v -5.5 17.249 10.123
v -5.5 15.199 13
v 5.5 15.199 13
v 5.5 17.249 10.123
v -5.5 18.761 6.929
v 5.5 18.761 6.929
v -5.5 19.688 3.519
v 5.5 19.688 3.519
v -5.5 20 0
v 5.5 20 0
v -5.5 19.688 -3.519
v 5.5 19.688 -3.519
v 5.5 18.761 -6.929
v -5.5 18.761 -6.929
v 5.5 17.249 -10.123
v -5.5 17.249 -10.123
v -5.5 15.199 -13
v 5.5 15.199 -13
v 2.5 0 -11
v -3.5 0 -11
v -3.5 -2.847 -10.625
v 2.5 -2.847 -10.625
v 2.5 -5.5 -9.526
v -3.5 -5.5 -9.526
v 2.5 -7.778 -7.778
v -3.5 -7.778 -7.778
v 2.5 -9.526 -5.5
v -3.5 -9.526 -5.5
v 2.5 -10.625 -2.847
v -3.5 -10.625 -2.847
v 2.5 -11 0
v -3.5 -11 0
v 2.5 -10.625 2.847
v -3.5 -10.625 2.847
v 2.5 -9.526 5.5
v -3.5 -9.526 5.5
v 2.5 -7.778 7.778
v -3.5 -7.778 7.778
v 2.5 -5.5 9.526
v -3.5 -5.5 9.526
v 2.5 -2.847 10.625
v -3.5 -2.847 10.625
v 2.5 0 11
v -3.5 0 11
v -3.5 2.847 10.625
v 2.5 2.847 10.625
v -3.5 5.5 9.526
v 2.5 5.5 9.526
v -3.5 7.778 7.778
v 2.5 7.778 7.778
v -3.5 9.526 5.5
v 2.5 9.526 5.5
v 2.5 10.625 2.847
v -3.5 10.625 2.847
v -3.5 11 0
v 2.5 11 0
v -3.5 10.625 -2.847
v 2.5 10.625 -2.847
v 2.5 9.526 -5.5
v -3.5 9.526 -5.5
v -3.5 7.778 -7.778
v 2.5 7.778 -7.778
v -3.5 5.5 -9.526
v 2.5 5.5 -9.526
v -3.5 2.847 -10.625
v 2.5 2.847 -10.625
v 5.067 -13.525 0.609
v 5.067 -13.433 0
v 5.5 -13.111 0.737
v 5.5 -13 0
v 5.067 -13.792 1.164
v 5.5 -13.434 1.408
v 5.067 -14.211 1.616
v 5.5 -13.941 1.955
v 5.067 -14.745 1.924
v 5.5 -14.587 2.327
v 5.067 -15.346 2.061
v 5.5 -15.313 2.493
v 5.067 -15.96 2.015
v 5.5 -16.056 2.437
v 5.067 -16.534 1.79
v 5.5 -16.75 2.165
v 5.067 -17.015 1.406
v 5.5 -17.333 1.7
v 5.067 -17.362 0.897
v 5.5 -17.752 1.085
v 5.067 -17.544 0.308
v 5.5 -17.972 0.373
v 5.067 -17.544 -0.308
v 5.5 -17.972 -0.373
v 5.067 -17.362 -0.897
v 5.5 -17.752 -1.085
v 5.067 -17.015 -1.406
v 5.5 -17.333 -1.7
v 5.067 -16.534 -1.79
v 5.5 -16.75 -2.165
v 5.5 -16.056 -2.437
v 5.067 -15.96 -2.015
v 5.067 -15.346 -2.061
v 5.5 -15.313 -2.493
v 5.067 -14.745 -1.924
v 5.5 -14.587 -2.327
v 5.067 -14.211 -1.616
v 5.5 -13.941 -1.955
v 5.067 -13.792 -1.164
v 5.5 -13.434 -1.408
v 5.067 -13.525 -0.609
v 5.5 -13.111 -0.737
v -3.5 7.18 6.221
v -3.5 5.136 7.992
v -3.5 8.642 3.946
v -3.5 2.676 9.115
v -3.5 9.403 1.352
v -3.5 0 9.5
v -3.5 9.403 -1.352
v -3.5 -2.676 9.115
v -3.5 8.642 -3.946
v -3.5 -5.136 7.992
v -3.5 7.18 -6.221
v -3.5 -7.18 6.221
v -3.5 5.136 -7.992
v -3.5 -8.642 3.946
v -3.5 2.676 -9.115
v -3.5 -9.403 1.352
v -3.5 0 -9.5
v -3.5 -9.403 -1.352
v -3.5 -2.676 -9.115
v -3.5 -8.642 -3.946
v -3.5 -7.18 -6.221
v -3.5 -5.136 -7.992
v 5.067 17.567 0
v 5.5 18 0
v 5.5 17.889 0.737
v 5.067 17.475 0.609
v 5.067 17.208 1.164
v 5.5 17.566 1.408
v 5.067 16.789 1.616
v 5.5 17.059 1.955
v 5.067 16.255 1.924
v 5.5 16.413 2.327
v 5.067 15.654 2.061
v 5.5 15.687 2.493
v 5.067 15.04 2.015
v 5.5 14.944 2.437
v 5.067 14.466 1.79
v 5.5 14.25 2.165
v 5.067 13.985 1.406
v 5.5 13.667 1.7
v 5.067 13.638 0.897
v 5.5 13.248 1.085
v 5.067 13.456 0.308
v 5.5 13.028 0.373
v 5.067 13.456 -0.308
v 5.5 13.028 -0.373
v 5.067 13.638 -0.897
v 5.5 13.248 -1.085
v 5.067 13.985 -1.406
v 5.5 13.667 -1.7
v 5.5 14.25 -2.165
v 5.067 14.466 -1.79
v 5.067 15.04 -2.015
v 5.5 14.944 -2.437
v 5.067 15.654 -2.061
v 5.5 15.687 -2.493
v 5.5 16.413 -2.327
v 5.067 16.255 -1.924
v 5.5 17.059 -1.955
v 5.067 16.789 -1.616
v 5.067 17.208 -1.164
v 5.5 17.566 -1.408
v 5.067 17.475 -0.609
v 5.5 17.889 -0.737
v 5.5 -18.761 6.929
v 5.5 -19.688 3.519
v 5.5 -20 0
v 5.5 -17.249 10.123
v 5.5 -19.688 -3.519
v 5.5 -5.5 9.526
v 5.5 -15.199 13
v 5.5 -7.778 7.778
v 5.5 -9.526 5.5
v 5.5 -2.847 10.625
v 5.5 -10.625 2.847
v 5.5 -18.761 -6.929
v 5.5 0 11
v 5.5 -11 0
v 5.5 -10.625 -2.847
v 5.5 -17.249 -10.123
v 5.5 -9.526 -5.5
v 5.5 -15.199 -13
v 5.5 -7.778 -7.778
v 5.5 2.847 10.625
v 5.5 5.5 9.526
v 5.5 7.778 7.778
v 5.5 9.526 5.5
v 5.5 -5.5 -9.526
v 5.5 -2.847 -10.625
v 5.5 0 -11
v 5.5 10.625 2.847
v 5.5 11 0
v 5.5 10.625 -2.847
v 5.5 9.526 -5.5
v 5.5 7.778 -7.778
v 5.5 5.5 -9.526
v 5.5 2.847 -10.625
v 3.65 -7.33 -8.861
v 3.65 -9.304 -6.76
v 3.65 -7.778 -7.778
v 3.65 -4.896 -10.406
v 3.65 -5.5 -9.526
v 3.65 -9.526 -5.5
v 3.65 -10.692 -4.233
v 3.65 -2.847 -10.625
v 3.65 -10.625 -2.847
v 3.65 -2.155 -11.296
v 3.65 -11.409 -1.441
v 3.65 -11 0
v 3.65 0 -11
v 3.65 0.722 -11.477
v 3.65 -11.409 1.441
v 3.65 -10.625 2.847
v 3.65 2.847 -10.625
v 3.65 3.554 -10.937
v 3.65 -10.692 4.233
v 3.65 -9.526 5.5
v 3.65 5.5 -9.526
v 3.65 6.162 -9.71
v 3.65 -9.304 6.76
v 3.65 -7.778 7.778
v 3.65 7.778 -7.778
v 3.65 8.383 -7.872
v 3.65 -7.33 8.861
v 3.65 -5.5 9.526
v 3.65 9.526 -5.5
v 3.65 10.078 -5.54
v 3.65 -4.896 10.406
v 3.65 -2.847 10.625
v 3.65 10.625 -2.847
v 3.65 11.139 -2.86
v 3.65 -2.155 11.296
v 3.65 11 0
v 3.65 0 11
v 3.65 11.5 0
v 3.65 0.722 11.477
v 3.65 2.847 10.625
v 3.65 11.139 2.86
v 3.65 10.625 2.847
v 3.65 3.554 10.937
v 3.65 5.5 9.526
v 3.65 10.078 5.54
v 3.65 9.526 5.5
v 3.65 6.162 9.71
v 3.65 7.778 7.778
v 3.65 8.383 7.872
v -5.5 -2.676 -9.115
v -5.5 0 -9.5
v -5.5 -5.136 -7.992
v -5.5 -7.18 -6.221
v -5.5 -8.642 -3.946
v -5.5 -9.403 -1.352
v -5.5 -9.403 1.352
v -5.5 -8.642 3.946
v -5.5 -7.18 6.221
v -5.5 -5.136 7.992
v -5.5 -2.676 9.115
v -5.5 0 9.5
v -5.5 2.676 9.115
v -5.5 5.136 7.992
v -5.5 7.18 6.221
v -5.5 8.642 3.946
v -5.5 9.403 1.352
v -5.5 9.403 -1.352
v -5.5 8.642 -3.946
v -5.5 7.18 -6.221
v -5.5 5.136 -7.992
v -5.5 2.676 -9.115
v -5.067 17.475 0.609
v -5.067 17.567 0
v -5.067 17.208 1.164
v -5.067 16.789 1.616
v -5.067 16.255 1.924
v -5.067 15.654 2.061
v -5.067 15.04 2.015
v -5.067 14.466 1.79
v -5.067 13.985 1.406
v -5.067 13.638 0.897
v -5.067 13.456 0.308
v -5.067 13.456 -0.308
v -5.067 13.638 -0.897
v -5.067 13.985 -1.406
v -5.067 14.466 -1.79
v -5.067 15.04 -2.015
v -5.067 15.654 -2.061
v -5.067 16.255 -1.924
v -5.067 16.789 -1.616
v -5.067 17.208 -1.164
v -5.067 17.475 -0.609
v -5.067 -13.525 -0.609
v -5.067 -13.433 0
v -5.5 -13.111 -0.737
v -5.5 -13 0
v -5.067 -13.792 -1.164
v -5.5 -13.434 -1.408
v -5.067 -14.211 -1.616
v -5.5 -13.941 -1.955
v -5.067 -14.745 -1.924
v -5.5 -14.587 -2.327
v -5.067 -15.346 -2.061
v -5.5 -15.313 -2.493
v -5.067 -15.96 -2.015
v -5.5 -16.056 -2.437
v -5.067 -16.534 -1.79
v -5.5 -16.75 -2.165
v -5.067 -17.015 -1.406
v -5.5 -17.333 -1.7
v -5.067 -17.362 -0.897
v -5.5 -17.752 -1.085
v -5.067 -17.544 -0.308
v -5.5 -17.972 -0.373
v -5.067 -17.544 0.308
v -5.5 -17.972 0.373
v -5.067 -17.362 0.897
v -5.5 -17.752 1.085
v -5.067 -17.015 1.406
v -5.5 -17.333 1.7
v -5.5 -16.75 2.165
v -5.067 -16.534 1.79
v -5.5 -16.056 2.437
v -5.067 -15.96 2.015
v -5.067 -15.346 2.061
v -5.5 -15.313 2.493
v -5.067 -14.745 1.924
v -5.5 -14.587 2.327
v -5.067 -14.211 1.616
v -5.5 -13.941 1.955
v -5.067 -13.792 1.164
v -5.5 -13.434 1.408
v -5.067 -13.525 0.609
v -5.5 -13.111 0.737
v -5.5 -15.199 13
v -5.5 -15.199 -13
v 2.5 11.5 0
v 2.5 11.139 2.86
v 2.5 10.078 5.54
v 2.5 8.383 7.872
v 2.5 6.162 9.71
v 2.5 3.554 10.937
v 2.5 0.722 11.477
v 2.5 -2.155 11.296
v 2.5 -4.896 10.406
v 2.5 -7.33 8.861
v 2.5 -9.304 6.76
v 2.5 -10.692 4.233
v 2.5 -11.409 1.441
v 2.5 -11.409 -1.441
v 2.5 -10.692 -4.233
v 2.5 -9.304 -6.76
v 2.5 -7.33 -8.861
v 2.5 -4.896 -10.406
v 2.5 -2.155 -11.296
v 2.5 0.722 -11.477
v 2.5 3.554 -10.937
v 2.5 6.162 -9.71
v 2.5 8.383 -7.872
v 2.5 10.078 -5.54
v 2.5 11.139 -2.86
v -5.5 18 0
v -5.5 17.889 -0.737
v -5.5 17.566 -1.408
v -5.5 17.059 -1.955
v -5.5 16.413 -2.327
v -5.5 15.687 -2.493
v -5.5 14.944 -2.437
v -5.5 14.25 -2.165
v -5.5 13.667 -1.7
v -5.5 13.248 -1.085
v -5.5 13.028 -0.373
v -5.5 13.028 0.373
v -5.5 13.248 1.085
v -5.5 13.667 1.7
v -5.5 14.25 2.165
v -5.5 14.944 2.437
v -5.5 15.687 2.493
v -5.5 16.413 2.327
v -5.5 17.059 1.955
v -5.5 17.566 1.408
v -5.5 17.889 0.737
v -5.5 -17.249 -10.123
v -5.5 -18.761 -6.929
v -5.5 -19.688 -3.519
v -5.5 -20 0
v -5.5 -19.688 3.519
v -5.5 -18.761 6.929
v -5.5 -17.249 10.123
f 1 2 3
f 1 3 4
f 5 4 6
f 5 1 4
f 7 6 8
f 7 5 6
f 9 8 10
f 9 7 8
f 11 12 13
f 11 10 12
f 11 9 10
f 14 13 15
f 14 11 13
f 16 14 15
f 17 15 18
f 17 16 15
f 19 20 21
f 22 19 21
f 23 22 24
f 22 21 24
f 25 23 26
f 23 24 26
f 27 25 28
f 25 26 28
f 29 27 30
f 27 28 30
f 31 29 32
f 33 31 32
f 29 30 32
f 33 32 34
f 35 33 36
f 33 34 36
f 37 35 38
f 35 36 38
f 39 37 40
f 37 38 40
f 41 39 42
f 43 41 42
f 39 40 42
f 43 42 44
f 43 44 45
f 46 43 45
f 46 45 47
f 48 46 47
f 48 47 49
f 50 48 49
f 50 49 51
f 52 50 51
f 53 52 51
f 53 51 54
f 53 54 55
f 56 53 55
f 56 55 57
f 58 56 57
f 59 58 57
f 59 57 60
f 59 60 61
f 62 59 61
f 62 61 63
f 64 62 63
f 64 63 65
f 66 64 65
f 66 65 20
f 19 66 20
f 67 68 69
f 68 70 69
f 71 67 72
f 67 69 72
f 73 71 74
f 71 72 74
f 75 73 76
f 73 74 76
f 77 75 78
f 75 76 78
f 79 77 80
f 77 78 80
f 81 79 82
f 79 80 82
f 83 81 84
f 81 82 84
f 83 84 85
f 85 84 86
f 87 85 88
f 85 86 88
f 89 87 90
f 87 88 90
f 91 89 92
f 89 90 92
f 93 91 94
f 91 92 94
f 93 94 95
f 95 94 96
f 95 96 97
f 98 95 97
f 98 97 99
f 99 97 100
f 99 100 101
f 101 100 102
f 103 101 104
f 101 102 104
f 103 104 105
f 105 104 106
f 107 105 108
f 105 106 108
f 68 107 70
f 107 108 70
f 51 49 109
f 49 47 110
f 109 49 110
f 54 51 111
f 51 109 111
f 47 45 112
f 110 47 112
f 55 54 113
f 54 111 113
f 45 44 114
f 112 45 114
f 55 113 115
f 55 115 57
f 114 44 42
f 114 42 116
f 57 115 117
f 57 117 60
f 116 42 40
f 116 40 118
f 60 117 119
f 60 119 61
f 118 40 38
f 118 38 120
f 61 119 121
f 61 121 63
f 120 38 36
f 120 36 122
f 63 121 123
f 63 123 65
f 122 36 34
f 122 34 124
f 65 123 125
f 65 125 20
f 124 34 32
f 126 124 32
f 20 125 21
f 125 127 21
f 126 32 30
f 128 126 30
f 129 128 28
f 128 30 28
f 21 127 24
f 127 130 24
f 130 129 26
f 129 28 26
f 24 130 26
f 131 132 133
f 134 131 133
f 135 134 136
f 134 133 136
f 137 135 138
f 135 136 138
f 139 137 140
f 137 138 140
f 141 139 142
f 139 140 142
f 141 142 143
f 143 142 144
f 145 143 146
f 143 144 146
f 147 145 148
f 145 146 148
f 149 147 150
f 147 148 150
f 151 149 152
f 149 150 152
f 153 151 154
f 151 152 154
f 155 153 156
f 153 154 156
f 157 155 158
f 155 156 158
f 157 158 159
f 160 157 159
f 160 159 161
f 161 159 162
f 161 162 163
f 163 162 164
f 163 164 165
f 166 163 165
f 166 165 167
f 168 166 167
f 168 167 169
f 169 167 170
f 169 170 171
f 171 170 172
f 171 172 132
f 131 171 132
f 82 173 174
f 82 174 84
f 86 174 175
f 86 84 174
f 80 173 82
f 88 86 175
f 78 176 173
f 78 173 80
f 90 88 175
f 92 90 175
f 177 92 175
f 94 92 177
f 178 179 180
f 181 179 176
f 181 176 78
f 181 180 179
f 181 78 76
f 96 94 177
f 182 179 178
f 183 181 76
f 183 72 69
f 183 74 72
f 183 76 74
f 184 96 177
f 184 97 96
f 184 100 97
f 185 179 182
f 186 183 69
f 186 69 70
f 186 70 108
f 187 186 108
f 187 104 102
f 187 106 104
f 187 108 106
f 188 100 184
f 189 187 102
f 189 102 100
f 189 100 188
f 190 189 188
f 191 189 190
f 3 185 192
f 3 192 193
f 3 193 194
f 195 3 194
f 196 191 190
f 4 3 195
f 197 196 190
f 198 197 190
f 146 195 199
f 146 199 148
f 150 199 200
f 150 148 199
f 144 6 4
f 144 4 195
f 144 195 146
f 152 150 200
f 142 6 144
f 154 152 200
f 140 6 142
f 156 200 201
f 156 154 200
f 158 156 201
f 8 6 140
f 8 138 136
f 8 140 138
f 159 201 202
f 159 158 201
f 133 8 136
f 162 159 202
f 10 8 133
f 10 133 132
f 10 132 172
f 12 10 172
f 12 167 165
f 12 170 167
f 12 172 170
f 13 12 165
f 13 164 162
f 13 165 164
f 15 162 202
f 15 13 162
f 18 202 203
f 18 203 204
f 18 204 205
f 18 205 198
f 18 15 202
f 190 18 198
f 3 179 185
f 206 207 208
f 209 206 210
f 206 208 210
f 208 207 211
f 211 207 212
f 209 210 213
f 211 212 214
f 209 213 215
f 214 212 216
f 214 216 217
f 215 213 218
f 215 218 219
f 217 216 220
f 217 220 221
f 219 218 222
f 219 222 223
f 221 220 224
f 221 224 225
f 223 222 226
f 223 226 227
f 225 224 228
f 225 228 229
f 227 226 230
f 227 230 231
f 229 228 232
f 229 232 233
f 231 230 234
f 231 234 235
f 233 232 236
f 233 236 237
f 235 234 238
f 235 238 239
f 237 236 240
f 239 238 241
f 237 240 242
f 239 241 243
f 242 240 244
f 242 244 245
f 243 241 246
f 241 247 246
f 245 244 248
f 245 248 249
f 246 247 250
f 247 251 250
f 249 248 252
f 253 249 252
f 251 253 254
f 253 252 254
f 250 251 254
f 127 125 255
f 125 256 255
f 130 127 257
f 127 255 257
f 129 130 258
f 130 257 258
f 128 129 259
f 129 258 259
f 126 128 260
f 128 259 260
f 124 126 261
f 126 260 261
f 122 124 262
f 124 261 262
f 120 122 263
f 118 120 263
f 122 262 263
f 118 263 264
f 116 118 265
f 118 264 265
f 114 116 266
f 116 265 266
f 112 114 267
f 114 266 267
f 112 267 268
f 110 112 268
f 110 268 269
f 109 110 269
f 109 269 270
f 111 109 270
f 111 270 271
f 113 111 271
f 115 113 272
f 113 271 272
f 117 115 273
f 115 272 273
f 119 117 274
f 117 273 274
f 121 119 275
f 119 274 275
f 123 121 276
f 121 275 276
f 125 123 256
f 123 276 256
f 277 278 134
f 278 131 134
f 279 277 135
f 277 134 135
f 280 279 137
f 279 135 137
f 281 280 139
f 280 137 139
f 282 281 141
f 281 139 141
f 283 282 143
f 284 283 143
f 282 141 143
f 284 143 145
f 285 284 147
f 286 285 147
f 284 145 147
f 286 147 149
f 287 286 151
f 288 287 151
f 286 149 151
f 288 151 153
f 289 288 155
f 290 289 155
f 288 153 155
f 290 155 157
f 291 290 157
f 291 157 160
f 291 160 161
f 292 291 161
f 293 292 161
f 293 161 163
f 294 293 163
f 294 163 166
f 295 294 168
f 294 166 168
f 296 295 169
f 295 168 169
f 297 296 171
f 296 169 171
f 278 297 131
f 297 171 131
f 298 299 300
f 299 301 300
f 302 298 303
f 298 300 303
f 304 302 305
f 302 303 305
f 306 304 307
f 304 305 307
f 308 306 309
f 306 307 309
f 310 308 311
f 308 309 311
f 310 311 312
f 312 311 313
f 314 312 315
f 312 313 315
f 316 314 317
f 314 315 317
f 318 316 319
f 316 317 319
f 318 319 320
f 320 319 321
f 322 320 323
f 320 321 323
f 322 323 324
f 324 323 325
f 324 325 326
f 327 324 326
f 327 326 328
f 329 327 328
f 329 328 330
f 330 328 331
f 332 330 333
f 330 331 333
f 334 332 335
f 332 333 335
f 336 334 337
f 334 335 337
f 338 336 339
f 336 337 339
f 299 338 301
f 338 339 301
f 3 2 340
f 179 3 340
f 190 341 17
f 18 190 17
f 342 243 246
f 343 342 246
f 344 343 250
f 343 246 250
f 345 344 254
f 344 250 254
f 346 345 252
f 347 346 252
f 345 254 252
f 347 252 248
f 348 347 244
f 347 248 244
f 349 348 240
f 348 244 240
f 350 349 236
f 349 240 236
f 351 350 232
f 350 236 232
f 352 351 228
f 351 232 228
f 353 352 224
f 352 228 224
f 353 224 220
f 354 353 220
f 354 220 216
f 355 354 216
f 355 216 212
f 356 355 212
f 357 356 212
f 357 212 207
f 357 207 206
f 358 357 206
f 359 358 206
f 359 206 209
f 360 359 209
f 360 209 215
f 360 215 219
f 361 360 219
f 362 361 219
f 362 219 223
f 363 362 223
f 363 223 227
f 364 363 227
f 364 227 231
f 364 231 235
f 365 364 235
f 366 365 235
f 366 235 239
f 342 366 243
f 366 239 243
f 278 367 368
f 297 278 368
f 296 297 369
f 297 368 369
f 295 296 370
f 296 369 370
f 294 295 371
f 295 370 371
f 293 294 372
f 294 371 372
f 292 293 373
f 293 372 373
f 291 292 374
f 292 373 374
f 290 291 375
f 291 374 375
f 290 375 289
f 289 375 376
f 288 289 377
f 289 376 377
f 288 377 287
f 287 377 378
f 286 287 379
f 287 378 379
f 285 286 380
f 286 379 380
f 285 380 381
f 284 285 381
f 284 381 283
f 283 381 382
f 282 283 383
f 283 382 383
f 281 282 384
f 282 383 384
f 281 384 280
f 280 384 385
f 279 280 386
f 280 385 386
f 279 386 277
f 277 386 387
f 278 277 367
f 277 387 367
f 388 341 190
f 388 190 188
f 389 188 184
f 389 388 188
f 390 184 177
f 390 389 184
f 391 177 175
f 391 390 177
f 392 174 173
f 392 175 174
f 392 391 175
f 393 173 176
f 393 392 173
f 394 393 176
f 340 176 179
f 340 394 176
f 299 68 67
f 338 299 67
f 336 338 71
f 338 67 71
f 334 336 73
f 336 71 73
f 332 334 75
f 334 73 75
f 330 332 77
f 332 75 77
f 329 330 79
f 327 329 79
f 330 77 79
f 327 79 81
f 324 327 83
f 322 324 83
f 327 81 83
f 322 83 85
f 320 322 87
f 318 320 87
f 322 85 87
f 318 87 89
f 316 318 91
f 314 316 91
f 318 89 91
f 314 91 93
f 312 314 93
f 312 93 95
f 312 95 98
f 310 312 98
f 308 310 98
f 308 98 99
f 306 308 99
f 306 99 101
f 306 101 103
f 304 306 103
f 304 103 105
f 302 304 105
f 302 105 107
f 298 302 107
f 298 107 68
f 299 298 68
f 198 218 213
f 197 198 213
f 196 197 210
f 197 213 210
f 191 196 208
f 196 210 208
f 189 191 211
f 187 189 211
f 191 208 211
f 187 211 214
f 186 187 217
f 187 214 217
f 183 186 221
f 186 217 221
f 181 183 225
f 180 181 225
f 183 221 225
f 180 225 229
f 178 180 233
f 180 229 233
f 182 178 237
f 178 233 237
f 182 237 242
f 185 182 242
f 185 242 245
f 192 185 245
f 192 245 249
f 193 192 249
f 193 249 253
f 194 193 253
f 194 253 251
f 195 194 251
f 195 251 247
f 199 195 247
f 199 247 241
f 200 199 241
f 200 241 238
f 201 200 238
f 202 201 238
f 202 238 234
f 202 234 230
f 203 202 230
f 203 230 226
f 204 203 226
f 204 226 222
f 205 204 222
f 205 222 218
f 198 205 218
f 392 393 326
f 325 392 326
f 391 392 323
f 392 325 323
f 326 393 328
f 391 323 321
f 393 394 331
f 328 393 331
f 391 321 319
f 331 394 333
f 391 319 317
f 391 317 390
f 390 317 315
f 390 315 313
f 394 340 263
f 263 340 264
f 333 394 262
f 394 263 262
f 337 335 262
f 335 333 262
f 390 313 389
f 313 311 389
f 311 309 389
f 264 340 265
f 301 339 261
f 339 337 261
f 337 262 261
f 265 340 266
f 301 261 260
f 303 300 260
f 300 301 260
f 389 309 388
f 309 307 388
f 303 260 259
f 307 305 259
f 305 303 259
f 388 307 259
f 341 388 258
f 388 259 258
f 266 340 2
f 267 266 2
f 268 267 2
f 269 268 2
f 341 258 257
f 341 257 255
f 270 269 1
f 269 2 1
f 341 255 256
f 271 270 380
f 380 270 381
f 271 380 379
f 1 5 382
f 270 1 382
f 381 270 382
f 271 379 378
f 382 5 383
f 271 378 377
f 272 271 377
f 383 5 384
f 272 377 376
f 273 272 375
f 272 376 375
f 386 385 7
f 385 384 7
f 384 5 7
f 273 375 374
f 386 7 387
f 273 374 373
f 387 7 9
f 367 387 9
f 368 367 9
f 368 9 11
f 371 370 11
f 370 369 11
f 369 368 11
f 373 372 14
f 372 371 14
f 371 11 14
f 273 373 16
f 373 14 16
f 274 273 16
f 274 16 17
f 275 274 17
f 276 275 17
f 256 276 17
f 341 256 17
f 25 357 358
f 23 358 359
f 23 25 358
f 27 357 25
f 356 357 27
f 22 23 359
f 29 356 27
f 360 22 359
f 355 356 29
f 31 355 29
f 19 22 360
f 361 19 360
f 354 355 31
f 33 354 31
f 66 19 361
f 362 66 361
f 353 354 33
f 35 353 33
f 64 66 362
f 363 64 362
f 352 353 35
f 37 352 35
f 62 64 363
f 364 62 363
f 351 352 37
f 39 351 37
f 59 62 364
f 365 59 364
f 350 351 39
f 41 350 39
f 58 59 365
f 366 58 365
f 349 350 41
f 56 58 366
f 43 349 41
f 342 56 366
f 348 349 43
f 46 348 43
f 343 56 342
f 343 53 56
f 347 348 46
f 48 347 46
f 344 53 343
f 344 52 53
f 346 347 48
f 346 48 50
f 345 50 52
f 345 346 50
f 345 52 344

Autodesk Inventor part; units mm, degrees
sketch "Sketch_1" plane through (0, 0, 0) normal (1, 0, 0) x (0, 0, -1)
  line L0 (-13, 15.1987) -> (-13, -15.1987)
  arc A0 (-13, -15.1987) -> (13, -15.1987) centre (0, 0) ccw
  line L1 (13, -15.1987) -> (13, 15.1987)
  arc A1 (13, 15.1987) -> (-13, 15.1987) centre (0, 0) ccw
extrude "Extrusion1" add sketch "Sketch_1" along normal mid plane 11
sketch "Sketch2" plane through (5.5, 0, 0) normal (1, 0, 0) x (0, 0, -1)
  point P0 (0, 0)
hole "Hole1" at (5.5, 0, 0) direction (-1, 0, 0) diameter 19 depth 11 counterbore diameter 22 counterbore depth 9
sketch "Sketch_9" plane through (0, 0, 0) normal (0, 0, 1) x (1, 0, 0)
  line L0 (3.65, 0) -> (2.5, 0)
  line L1 (2.5, 0) -> (2.5, 11.5)
  line L2 (2.5, 11.5) -> (3.65, 11.5)
  line L3 (3.65, 11.5) -> (3.65, 0)
  line L4 (3.65, 0) -> (2.5, 0)
revolve "Revolution1" cut sketch "Sketch_9" angle 360 about axis through (3.65, 0, 0) along (1, 0, 0)
sketch "Sketch_8" plane through (0, 0, 0) normal (0, 0, 1) x (1, 0, 0)
  line L0 (5.5, -15.5) -> (-5.5, -15.5)
  line L1 (-5.5, -15.5) -> (-5.5, -13)
  line L2 (-5.5, -13) -> (-5.067, -13.433)
  line L3 (-5.067, -13.433) -> (5.067, -13.433)
  line L4 (5.067, -13.433) -> (5.5, -13)
  line L5 (5.5, -13) -> (5.5, -15.5)
  line L6 (5.5, -15.5) -> (-5.5, -15.5)
revolve "Revolution2" cut sketch "Sketch_8" angle 360 about axis through (5.5, -15.5, 0) along (1, 0, 0)
thread "Thread1" size "M5x0.8" class "6H" standard "ISO Metric profile" full length
sketch "Sketch_2" plane through (0, 0, 0) normal (0, 0, 1) x (1, 0, 0)
  line L0 (5.5, 15.5) -> (-5.5, 15.5)
  line L1 (-5.5, 15.5) -> (-5.5, 18)
  line L2 (-5.5, 18) -> (-5.067, 17.567)
  line L3 (-5.067, 17.567) -> (5.067, 17.567)
  line L4 (5.067, 17.567) -> (5.5, 18)
  line L5 (5.5, 18) -> (5.5, 15.5)
  line L6 (5.5, 15.5) -> (-5.5, 15.5)
revolve "Revolution3" cut sketch "Sketch_2" angle 360 about axis through (5.5, 15.5, 0) along (1, 0, 0)
thread "Thread2" size "M5x0.8" class "6H" standard "ISO Metric profile" full length
ref_plane "HOUSING_TO_DUMMY_XY" through (0, 0, 0) normal (0, 0, 1) x (1, 0, 0)
ref_plane "HOUSING_TO_DUMMY_YZ" through (0, 0, 0) normal (1, 0, 0) x (0, 1, 0)
ref_plane "HOUSING_TO_DUMMY_ZX" through (0, 0, 0) normal (0, 1, 0) x (0, 0, 1)
ref_plane "bgcab_to_rring_XY" through (2.5, 0, 0) normal (-1, 0, 0) x (0, 0, -1)
ref_plane "bgcab_to_rring_YZ" through (2.5, 0, 0) normal (0, 0, -1) x (0, -1, 0)
ref_plane "bgcab_to_rring_ZX" through (2.5, 0, 0) normal (0, -1, 0) x (-1, 0, 0)
ref_plane "to_bearings_XY" through (-3.5, 0, 0) normal (-1, 0, 0) x (0, 0, -1)
ref_plane "to_bearings_YZ" through (-3.5, 0, 0) normal (0, 0, -1) x (0, -1, 0)
ref_plane "to_bearings_ZX" through (-3.5, 0, 0) normal (0, -1, 0) x (-1, 0, 0)
properties part number "BGTAB6900VV_h"
